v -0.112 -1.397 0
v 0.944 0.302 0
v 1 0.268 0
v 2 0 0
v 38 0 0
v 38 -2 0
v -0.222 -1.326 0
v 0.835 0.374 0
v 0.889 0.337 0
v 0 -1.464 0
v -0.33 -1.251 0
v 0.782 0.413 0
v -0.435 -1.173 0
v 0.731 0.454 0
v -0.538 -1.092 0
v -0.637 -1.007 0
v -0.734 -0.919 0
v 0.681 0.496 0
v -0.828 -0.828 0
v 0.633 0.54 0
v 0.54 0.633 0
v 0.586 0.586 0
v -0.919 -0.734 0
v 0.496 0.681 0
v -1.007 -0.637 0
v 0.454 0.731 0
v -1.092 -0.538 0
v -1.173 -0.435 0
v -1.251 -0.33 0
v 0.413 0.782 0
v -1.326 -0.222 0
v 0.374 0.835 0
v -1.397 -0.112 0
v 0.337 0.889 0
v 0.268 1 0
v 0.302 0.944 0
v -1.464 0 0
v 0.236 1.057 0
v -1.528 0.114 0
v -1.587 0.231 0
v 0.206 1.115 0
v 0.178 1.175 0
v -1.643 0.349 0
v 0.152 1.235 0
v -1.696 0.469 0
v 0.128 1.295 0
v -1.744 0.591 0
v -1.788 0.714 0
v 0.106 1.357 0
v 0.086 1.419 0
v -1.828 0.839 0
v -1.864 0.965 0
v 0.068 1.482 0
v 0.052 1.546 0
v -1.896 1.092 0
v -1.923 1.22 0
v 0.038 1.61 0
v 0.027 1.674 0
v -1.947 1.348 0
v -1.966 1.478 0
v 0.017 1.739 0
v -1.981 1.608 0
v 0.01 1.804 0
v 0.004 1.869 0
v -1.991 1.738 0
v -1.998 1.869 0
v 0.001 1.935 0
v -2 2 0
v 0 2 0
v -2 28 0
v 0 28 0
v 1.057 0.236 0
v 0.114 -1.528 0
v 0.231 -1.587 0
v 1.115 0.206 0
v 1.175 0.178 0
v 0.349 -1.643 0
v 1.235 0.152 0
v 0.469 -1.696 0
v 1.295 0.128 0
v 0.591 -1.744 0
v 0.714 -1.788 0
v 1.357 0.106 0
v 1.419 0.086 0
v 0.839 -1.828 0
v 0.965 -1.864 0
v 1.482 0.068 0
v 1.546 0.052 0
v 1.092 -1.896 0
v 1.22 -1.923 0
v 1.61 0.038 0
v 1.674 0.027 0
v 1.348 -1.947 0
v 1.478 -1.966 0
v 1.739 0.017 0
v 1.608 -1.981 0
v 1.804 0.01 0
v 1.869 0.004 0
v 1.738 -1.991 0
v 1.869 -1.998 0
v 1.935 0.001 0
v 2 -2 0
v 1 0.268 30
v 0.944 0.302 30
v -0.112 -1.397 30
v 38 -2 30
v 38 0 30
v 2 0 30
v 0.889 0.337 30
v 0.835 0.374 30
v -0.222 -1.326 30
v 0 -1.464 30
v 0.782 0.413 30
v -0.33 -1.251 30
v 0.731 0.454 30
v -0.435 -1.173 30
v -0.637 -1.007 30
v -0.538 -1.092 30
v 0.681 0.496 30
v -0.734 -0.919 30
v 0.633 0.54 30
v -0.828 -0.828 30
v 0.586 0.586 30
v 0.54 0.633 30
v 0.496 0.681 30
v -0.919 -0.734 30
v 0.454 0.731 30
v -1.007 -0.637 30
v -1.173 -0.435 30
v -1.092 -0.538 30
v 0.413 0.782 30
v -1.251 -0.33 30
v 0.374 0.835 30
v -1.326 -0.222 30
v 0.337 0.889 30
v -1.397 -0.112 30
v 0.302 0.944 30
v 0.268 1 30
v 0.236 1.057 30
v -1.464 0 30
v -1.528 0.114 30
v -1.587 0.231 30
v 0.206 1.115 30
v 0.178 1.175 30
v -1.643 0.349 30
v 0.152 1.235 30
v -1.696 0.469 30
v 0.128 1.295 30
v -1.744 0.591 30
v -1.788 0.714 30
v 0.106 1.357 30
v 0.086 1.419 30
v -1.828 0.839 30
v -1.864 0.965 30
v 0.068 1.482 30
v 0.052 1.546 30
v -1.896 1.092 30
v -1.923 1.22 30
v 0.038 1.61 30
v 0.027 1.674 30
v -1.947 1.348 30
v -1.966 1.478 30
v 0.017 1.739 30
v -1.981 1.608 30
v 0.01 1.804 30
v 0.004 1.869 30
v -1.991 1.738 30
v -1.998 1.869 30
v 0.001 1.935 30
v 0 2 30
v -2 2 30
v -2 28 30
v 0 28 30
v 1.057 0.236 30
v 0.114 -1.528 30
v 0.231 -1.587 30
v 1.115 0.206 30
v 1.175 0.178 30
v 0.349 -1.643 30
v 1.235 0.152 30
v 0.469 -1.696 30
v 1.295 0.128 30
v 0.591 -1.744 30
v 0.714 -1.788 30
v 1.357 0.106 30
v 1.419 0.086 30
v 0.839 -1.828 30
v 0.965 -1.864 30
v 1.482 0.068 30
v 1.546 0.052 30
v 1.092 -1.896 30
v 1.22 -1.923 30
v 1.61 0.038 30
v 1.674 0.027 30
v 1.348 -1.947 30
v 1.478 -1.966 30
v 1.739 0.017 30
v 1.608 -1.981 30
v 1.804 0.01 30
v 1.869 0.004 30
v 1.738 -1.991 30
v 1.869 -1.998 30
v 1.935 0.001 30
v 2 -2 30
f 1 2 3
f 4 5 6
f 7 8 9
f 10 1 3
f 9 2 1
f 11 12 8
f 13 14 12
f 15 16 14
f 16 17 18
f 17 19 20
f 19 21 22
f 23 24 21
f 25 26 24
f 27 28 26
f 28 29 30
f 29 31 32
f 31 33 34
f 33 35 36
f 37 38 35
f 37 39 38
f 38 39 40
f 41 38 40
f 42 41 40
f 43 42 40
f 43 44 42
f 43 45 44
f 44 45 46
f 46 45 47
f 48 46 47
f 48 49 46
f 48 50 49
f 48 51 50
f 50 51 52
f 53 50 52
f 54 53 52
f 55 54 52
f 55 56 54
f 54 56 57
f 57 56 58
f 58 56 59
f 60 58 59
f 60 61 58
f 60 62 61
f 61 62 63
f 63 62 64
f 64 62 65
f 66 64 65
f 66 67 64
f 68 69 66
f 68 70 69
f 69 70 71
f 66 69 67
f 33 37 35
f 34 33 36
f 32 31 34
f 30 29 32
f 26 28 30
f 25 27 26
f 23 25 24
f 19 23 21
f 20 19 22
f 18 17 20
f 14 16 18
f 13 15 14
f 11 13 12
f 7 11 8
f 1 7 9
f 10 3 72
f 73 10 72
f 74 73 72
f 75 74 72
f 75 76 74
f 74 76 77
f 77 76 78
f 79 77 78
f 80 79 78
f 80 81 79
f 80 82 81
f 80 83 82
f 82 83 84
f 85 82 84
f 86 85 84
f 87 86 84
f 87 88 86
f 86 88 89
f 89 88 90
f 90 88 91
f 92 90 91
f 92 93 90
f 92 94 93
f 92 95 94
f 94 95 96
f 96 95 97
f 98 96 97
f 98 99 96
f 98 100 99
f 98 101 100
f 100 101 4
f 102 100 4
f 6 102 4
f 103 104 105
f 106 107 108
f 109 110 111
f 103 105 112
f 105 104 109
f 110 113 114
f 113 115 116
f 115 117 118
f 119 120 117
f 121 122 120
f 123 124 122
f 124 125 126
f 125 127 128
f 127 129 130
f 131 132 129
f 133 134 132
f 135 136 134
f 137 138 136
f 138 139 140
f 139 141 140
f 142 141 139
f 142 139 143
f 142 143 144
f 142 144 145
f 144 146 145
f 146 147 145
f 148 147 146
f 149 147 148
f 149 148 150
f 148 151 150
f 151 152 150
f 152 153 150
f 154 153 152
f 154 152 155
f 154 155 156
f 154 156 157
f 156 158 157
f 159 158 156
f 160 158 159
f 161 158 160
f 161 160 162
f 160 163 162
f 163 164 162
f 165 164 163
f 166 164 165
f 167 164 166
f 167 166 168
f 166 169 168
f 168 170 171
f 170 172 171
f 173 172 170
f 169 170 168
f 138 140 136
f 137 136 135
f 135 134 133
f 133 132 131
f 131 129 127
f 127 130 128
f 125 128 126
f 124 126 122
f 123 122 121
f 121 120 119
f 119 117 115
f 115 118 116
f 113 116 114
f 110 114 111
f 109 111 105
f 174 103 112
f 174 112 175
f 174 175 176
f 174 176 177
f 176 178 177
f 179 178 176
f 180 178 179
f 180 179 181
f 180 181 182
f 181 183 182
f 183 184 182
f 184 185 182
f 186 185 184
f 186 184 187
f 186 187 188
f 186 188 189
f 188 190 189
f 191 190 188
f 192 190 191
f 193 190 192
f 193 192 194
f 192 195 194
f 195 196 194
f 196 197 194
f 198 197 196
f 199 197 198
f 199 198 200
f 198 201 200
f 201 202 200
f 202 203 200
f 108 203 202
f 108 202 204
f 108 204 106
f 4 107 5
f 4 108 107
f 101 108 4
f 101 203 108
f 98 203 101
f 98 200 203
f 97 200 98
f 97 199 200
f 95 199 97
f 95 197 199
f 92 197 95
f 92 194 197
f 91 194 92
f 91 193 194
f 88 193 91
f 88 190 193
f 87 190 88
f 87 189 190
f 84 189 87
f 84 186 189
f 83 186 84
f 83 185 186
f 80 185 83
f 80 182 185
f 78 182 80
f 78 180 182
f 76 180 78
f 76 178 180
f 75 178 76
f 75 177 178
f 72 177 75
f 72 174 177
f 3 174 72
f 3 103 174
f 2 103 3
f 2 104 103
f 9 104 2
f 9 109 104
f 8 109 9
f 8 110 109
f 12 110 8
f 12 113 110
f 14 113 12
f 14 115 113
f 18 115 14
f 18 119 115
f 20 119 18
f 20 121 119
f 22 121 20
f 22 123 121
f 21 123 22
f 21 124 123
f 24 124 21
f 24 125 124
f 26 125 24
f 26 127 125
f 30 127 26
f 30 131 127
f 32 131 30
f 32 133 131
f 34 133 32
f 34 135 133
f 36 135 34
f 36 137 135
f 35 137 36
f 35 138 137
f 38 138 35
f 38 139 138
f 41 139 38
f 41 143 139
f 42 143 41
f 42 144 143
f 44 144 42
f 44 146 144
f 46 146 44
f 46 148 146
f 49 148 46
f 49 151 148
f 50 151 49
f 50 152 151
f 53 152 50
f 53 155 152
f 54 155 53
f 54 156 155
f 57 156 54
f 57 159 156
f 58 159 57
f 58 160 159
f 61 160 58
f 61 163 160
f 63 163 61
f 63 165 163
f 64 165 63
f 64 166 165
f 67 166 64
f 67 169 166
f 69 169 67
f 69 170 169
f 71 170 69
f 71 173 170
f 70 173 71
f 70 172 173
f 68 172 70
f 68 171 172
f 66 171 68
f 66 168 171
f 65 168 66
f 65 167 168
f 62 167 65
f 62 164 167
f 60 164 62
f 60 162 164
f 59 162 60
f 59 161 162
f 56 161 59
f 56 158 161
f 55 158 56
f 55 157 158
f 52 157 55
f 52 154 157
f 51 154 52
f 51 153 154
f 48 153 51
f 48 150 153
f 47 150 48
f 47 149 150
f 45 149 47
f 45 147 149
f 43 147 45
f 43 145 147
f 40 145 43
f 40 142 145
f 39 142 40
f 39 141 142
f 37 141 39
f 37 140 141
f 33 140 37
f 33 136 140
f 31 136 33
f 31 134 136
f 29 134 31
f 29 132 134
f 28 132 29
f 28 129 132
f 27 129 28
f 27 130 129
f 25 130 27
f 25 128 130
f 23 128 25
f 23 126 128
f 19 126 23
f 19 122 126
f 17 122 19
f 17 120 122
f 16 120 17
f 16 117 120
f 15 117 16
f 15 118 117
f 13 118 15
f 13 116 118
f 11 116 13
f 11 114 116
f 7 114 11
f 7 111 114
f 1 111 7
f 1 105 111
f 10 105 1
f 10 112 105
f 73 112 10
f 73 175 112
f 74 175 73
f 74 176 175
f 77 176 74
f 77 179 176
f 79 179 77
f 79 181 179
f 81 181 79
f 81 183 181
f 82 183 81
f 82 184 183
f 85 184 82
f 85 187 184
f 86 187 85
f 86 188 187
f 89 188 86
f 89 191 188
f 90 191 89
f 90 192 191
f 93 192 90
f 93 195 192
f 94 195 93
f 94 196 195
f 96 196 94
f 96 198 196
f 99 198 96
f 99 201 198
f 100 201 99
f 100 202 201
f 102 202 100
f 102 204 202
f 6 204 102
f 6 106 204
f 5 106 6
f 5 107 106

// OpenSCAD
// Units: mm

thickness_mm = 2.0;
bend_radius_mm = 2.0;
k_factor = 0.45;

outside_length_long_mm = 40.0;
outside_length_short_mm = 30.0;
bracket_width_mm = 30.0;
bend_angle_deg = 90.0;

outside_bend_radius_mm = bend_radius_mm + thickness_mm;
outside_setback_mm = outside_bend_radius_mm * tan(bend_angle_deg / 2);
bend_allowance_mm = (bend_angle_deg * PI / 180) * (bend_radius_mm + k_factor * thickness_mm);
flat_length_mm = outside_length_long_mm + outside_length_short_mm - 2 * outside_setback_mm + bend_allowance_mm;

arc_segments = 48;
center = [bend_radius_mm, bend_radius_mm];

x_end = outside_length_long_mm - thickness_mm;
z_end = outside_length_short_mm - thickness_mm;

function arc_points(radius, a0, a1, n) =
    [for (i = [0:n])
        let(a = a0 + (a1 - a0) * i / n)
        [center[0] + radius * cos(a), center[1] + radius * sin(a)]
    ];

inner_arc = arc_points(bend_radius_mm, -90, -180, arc_segments);
outer_arc = arc_points(outside_bend_radius_mm, 180, 270, arc_segments);

cross_section_points =
    concat(
        [[x_end, 0]],
        inner_arc,
        [[0, z_end], [-thickness_mm, z_end], [-thickness_mm, bend_radius_mm]],
        outer_arc,
        [[x_end, -thickness_mm]]
    );

echo(str("MAKERBENCH-SHEETMETAL: {\"thickness_mm\": ", thickness_mm,
         ", \"bend_radius_mm\": ", bend_radius_mm,
         ", \"flat_length_mm\": ", flat_length_mm, "}"));

linear_extrude(height = bracket_width_mm)
    polygon(points = cross_section_points);
